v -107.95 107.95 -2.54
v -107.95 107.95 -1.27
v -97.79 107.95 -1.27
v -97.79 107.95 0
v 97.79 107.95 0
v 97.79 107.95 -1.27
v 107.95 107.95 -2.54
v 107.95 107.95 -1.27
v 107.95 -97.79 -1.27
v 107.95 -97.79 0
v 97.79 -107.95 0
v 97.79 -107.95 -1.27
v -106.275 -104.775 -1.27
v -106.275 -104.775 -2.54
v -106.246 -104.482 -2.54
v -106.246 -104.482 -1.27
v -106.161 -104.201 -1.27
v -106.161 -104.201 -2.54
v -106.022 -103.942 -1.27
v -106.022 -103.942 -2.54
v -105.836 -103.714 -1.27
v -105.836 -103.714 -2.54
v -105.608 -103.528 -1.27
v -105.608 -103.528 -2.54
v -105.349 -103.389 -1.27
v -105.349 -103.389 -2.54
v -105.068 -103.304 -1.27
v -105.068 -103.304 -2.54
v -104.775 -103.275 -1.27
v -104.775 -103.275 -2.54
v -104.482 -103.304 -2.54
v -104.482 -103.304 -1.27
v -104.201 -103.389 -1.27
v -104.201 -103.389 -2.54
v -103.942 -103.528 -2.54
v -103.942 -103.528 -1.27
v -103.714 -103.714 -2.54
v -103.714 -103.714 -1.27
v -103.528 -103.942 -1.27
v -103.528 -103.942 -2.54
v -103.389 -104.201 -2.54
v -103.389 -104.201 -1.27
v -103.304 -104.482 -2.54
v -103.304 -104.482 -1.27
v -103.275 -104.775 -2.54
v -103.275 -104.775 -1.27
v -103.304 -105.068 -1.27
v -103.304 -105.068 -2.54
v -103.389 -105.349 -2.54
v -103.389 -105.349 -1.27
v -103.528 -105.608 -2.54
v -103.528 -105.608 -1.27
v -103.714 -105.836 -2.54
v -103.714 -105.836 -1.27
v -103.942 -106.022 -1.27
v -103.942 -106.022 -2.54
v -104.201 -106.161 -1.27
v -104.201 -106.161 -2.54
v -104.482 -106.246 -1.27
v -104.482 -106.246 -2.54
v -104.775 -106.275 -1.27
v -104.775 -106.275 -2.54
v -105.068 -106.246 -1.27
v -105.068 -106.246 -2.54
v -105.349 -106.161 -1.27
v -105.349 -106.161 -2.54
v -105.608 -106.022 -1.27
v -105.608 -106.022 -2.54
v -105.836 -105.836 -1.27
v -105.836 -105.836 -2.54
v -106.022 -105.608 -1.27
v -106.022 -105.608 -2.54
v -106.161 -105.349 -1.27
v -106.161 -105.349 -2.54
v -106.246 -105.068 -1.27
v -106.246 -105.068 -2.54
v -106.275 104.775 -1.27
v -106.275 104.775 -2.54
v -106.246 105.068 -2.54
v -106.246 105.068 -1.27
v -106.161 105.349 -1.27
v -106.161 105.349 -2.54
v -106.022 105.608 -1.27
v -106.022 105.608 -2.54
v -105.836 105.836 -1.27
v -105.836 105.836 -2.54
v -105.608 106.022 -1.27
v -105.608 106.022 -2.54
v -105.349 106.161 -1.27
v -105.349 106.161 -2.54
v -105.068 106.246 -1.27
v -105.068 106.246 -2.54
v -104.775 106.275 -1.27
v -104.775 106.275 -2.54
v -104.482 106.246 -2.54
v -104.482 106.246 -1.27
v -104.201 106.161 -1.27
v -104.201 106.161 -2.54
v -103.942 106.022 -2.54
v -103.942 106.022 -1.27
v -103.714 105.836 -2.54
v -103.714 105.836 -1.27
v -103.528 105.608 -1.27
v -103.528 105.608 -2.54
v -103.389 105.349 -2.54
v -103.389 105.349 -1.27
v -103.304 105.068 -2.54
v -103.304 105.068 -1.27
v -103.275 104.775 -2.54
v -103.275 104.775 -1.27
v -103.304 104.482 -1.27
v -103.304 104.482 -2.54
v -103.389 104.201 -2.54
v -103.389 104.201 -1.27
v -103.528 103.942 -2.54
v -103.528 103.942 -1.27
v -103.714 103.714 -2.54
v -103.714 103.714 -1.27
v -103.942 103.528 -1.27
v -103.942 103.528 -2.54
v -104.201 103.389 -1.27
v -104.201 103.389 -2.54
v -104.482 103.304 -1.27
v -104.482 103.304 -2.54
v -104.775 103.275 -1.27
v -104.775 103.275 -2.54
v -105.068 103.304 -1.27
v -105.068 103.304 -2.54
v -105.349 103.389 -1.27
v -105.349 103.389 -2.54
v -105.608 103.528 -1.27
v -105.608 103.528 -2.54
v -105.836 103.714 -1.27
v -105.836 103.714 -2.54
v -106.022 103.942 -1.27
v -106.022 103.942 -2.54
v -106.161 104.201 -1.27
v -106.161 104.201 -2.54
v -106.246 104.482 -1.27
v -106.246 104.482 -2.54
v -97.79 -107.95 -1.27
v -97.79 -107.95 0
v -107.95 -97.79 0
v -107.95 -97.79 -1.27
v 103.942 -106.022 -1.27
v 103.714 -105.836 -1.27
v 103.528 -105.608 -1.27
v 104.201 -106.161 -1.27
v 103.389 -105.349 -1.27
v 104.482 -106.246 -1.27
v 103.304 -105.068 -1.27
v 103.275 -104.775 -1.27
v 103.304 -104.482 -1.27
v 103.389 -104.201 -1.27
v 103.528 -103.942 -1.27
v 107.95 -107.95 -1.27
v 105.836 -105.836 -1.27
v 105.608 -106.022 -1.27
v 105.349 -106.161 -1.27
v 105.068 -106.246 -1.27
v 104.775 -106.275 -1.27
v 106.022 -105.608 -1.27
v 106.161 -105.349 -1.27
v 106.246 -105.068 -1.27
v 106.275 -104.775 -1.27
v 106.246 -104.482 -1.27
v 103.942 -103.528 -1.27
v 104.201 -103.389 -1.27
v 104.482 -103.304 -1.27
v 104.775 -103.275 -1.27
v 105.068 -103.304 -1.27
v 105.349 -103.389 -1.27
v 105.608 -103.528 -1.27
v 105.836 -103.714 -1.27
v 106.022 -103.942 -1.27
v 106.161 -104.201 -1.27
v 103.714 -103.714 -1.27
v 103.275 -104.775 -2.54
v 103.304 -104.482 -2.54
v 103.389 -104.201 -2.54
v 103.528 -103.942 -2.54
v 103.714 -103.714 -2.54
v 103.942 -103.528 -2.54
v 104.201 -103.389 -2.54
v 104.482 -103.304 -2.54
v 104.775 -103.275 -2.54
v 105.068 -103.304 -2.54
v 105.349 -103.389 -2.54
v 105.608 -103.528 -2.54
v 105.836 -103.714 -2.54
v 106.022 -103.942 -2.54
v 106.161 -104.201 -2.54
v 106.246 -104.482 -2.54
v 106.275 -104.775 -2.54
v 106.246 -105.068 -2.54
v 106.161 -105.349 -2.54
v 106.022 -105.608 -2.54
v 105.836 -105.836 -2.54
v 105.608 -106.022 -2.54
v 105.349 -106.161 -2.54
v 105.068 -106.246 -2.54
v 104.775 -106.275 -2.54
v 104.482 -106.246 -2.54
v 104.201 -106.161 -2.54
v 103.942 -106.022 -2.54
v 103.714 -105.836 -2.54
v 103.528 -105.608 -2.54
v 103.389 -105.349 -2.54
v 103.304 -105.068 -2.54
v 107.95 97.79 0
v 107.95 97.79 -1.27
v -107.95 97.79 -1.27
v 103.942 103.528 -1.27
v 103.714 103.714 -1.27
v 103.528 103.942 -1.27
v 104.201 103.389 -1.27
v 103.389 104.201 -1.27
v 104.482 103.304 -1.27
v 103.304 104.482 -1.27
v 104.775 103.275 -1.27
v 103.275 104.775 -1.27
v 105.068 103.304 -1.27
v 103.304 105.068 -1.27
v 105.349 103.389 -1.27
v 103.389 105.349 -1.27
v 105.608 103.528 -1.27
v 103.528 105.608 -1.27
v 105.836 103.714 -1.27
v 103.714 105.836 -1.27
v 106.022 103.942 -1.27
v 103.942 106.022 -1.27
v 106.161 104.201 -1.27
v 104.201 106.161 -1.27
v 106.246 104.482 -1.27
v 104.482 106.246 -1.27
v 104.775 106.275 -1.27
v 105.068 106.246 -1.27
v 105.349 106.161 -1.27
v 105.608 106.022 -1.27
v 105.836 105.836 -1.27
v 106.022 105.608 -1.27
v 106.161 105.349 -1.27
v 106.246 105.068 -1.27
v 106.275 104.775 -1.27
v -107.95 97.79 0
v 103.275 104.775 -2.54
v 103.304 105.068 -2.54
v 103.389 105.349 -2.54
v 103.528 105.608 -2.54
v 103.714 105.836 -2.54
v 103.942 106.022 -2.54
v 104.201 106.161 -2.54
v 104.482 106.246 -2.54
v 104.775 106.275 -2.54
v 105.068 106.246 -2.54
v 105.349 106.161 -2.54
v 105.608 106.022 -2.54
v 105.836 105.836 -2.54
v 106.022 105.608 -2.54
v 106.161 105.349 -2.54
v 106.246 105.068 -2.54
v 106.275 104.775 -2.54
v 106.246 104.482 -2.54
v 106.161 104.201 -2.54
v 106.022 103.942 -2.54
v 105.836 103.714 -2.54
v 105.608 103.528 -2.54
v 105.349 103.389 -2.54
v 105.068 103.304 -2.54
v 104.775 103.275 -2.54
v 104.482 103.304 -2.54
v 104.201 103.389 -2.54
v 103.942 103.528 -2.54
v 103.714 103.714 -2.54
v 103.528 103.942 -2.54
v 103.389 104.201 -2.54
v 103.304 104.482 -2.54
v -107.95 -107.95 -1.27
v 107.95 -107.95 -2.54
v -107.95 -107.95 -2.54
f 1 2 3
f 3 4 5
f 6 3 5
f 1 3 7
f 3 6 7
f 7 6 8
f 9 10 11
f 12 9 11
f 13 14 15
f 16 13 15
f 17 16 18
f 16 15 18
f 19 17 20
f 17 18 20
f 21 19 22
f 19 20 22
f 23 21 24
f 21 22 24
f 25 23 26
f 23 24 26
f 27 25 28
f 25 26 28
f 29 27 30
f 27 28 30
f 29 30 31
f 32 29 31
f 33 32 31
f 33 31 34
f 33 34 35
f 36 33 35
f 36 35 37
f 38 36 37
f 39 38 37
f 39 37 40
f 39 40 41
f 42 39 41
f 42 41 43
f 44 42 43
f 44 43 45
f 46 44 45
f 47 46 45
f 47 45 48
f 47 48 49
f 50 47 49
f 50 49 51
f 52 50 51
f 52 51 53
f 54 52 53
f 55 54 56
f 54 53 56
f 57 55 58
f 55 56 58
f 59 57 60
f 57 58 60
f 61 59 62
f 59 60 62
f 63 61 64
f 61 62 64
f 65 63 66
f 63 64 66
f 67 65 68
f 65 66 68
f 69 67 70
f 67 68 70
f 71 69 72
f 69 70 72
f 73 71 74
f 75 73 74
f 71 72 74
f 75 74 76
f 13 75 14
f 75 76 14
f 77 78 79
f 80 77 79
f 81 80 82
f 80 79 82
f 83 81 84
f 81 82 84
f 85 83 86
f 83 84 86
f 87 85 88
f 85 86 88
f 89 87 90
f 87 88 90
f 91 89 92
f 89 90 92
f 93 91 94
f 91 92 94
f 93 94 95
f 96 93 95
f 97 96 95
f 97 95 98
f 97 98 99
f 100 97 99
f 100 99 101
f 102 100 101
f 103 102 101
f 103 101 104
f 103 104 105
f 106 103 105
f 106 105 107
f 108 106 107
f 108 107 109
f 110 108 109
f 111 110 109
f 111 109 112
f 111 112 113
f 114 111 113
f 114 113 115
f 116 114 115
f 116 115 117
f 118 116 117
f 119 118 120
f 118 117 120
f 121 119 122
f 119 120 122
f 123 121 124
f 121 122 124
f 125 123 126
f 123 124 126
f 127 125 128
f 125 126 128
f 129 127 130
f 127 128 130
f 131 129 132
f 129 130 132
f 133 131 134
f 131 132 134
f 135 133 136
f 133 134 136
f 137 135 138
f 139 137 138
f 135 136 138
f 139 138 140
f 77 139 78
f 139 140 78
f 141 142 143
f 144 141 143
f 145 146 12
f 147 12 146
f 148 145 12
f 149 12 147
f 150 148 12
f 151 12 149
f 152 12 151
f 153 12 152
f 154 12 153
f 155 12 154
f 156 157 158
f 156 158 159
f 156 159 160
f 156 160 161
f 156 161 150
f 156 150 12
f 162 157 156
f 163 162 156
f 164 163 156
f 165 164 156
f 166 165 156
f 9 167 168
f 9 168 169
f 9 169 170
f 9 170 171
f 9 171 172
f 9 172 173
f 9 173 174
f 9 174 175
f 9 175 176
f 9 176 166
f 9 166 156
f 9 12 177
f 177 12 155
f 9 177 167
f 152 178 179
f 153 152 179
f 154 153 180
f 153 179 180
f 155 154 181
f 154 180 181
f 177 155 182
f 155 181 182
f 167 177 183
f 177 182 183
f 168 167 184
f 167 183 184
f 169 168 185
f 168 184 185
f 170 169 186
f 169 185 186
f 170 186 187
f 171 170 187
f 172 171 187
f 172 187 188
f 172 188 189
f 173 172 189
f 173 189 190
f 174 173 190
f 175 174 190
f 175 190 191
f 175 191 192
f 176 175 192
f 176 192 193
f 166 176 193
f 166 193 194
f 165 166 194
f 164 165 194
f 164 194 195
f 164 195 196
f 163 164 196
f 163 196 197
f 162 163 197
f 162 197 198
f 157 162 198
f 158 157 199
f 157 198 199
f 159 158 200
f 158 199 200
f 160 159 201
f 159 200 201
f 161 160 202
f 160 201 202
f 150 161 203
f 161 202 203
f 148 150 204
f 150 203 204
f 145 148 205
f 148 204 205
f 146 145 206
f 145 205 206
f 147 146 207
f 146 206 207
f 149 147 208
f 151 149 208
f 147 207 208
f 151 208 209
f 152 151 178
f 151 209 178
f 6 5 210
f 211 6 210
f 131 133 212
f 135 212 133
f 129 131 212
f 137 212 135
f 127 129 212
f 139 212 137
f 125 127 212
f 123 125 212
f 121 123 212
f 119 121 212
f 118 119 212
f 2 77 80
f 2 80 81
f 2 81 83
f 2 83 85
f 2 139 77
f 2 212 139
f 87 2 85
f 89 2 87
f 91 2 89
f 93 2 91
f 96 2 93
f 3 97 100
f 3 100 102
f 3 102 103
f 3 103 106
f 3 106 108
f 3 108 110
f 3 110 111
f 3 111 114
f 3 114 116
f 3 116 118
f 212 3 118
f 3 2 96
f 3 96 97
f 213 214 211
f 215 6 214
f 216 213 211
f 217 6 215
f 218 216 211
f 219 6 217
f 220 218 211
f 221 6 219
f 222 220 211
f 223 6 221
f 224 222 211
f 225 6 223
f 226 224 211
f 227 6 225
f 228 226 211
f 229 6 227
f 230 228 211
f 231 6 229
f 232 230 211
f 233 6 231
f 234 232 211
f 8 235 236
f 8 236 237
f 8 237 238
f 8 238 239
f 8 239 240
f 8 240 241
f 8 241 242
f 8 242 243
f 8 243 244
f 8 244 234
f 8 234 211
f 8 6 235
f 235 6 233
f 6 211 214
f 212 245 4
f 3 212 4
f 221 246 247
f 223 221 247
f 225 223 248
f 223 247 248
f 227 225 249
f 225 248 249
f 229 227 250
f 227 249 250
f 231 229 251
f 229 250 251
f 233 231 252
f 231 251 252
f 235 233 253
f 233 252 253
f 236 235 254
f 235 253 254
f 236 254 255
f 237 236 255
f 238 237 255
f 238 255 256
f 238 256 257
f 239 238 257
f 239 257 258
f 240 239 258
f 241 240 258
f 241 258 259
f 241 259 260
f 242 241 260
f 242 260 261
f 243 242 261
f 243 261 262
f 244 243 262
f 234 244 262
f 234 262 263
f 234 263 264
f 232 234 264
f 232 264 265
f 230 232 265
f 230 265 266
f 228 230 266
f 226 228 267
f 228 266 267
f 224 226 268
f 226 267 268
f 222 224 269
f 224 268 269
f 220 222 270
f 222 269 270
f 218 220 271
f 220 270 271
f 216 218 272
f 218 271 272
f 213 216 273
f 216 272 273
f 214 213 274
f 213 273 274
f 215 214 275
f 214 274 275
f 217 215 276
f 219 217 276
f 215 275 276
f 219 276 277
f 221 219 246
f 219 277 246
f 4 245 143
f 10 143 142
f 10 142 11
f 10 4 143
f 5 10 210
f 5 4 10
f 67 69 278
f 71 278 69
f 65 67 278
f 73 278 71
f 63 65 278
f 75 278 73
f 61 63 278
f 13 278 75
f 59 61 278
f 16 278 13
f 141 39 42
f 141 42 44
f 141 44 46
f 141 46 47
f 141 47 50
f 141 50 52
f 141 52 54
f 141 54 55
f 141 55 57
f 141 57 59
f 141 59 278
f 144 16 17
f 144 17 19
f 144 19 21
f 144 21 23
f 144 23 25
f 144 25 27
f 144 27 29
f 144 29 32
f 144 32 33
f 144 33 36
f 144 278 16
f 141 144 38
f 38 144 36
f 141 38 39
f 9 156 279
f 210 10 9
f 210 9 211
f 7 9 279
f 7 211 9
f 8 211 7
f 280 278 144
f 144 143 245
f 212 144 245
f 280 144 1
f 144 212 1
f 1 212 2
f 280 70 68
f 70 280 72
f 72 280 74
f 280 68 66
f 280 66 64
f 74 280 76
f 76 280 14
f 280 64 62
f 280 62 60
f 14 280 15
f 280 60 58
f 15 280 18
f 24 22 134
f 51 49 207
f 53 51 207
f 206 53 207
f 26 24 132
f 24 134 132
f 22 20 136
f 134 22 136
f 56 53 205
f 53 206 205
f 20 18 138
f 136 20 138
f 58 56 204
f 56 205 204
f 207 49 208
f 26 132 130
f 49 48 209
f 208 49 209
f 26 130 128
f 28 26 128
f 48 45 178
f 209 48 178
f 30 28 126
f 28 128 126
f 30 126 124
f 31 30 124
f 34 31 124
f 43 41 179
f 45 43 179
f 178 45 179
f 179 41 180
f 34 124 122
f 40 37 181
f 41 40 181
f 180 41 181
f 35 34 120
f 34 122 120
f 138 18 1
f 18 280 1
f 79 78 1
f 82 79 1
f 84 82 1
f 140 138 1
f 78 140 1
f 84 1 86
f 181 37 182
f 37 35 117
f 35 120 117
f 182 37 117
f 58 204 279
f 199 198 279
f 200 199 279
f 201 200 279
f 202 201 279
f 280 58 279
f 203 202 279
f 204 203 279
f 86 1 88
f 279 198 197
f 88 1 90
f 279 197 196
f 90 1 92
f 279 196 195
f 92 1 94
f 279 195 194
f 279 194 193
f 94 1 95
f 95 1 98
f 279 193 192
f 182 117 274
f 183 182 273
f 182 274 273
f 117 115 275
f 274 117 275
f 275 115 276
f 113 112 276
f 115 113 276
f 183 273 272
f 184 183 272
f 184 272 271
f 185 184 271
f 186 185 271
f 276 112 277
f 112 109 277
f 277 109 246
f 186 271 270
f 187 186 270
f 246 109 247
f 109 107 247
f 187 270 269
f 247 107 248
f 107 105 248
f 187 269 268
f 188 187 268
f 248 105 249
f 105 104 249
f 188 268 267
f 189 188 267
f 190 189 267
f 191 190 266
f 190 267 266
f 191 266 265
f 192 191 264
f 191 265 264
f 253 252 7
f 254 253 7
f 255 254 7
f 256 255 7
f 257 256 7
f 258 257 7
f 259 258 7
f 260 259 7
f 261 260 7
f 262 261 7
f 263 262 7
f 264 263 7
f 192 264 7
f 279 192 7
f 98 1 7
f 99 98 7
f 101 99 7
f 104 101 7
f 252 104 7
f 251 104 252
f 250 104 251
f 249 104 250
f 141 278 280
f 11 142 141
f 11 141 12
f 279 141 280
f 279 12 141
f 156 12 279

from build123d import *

# Parameters (mm, degrees)
F0_W     = 215.9
F0_H     = 215.9
F1_DEPTH = 2.54
F3_DEPTH = 1.27
F5_D     = 3


with BuildPart() as f1:
    # F0 (on Top) → F1 (new body)
    with BuildSketch(Plane.XY):
        Rectangle(F0_W, F0_H)
    extrude(amount=-F1_DEPTH)

    # F2 (on face) → F3 (cut)
    with BuildSketch(Plane.XY):
        Polygon((-107.95, 107.95), (-107.95, 97.79), (-97.79, 107.95), align=None)
        Polygon((107.95, 97.79), (107.95, 107.95), (97.79, 107.95), align=None)
        Polygon((97.79, -107.95), (107.95, -107.95), (107.95, -97.79), align=None)
        Polygon((-97.79, -107.95), (-107.95, -97.79), (-107.95, -107.95), align=None)
    extrude(amount=-F3_DEPTH, mode=Mode.SUBTRACT)

    # F5 (through all)
    with Locations(Plane.XY.offset(-1.27)):
        with Locations((104.775, -104.775), (-104.775, -104.775), (-104.775, 104.775), (104.775, 104.775)):
            Hole(F5_D / 2)


solid = f1.part
